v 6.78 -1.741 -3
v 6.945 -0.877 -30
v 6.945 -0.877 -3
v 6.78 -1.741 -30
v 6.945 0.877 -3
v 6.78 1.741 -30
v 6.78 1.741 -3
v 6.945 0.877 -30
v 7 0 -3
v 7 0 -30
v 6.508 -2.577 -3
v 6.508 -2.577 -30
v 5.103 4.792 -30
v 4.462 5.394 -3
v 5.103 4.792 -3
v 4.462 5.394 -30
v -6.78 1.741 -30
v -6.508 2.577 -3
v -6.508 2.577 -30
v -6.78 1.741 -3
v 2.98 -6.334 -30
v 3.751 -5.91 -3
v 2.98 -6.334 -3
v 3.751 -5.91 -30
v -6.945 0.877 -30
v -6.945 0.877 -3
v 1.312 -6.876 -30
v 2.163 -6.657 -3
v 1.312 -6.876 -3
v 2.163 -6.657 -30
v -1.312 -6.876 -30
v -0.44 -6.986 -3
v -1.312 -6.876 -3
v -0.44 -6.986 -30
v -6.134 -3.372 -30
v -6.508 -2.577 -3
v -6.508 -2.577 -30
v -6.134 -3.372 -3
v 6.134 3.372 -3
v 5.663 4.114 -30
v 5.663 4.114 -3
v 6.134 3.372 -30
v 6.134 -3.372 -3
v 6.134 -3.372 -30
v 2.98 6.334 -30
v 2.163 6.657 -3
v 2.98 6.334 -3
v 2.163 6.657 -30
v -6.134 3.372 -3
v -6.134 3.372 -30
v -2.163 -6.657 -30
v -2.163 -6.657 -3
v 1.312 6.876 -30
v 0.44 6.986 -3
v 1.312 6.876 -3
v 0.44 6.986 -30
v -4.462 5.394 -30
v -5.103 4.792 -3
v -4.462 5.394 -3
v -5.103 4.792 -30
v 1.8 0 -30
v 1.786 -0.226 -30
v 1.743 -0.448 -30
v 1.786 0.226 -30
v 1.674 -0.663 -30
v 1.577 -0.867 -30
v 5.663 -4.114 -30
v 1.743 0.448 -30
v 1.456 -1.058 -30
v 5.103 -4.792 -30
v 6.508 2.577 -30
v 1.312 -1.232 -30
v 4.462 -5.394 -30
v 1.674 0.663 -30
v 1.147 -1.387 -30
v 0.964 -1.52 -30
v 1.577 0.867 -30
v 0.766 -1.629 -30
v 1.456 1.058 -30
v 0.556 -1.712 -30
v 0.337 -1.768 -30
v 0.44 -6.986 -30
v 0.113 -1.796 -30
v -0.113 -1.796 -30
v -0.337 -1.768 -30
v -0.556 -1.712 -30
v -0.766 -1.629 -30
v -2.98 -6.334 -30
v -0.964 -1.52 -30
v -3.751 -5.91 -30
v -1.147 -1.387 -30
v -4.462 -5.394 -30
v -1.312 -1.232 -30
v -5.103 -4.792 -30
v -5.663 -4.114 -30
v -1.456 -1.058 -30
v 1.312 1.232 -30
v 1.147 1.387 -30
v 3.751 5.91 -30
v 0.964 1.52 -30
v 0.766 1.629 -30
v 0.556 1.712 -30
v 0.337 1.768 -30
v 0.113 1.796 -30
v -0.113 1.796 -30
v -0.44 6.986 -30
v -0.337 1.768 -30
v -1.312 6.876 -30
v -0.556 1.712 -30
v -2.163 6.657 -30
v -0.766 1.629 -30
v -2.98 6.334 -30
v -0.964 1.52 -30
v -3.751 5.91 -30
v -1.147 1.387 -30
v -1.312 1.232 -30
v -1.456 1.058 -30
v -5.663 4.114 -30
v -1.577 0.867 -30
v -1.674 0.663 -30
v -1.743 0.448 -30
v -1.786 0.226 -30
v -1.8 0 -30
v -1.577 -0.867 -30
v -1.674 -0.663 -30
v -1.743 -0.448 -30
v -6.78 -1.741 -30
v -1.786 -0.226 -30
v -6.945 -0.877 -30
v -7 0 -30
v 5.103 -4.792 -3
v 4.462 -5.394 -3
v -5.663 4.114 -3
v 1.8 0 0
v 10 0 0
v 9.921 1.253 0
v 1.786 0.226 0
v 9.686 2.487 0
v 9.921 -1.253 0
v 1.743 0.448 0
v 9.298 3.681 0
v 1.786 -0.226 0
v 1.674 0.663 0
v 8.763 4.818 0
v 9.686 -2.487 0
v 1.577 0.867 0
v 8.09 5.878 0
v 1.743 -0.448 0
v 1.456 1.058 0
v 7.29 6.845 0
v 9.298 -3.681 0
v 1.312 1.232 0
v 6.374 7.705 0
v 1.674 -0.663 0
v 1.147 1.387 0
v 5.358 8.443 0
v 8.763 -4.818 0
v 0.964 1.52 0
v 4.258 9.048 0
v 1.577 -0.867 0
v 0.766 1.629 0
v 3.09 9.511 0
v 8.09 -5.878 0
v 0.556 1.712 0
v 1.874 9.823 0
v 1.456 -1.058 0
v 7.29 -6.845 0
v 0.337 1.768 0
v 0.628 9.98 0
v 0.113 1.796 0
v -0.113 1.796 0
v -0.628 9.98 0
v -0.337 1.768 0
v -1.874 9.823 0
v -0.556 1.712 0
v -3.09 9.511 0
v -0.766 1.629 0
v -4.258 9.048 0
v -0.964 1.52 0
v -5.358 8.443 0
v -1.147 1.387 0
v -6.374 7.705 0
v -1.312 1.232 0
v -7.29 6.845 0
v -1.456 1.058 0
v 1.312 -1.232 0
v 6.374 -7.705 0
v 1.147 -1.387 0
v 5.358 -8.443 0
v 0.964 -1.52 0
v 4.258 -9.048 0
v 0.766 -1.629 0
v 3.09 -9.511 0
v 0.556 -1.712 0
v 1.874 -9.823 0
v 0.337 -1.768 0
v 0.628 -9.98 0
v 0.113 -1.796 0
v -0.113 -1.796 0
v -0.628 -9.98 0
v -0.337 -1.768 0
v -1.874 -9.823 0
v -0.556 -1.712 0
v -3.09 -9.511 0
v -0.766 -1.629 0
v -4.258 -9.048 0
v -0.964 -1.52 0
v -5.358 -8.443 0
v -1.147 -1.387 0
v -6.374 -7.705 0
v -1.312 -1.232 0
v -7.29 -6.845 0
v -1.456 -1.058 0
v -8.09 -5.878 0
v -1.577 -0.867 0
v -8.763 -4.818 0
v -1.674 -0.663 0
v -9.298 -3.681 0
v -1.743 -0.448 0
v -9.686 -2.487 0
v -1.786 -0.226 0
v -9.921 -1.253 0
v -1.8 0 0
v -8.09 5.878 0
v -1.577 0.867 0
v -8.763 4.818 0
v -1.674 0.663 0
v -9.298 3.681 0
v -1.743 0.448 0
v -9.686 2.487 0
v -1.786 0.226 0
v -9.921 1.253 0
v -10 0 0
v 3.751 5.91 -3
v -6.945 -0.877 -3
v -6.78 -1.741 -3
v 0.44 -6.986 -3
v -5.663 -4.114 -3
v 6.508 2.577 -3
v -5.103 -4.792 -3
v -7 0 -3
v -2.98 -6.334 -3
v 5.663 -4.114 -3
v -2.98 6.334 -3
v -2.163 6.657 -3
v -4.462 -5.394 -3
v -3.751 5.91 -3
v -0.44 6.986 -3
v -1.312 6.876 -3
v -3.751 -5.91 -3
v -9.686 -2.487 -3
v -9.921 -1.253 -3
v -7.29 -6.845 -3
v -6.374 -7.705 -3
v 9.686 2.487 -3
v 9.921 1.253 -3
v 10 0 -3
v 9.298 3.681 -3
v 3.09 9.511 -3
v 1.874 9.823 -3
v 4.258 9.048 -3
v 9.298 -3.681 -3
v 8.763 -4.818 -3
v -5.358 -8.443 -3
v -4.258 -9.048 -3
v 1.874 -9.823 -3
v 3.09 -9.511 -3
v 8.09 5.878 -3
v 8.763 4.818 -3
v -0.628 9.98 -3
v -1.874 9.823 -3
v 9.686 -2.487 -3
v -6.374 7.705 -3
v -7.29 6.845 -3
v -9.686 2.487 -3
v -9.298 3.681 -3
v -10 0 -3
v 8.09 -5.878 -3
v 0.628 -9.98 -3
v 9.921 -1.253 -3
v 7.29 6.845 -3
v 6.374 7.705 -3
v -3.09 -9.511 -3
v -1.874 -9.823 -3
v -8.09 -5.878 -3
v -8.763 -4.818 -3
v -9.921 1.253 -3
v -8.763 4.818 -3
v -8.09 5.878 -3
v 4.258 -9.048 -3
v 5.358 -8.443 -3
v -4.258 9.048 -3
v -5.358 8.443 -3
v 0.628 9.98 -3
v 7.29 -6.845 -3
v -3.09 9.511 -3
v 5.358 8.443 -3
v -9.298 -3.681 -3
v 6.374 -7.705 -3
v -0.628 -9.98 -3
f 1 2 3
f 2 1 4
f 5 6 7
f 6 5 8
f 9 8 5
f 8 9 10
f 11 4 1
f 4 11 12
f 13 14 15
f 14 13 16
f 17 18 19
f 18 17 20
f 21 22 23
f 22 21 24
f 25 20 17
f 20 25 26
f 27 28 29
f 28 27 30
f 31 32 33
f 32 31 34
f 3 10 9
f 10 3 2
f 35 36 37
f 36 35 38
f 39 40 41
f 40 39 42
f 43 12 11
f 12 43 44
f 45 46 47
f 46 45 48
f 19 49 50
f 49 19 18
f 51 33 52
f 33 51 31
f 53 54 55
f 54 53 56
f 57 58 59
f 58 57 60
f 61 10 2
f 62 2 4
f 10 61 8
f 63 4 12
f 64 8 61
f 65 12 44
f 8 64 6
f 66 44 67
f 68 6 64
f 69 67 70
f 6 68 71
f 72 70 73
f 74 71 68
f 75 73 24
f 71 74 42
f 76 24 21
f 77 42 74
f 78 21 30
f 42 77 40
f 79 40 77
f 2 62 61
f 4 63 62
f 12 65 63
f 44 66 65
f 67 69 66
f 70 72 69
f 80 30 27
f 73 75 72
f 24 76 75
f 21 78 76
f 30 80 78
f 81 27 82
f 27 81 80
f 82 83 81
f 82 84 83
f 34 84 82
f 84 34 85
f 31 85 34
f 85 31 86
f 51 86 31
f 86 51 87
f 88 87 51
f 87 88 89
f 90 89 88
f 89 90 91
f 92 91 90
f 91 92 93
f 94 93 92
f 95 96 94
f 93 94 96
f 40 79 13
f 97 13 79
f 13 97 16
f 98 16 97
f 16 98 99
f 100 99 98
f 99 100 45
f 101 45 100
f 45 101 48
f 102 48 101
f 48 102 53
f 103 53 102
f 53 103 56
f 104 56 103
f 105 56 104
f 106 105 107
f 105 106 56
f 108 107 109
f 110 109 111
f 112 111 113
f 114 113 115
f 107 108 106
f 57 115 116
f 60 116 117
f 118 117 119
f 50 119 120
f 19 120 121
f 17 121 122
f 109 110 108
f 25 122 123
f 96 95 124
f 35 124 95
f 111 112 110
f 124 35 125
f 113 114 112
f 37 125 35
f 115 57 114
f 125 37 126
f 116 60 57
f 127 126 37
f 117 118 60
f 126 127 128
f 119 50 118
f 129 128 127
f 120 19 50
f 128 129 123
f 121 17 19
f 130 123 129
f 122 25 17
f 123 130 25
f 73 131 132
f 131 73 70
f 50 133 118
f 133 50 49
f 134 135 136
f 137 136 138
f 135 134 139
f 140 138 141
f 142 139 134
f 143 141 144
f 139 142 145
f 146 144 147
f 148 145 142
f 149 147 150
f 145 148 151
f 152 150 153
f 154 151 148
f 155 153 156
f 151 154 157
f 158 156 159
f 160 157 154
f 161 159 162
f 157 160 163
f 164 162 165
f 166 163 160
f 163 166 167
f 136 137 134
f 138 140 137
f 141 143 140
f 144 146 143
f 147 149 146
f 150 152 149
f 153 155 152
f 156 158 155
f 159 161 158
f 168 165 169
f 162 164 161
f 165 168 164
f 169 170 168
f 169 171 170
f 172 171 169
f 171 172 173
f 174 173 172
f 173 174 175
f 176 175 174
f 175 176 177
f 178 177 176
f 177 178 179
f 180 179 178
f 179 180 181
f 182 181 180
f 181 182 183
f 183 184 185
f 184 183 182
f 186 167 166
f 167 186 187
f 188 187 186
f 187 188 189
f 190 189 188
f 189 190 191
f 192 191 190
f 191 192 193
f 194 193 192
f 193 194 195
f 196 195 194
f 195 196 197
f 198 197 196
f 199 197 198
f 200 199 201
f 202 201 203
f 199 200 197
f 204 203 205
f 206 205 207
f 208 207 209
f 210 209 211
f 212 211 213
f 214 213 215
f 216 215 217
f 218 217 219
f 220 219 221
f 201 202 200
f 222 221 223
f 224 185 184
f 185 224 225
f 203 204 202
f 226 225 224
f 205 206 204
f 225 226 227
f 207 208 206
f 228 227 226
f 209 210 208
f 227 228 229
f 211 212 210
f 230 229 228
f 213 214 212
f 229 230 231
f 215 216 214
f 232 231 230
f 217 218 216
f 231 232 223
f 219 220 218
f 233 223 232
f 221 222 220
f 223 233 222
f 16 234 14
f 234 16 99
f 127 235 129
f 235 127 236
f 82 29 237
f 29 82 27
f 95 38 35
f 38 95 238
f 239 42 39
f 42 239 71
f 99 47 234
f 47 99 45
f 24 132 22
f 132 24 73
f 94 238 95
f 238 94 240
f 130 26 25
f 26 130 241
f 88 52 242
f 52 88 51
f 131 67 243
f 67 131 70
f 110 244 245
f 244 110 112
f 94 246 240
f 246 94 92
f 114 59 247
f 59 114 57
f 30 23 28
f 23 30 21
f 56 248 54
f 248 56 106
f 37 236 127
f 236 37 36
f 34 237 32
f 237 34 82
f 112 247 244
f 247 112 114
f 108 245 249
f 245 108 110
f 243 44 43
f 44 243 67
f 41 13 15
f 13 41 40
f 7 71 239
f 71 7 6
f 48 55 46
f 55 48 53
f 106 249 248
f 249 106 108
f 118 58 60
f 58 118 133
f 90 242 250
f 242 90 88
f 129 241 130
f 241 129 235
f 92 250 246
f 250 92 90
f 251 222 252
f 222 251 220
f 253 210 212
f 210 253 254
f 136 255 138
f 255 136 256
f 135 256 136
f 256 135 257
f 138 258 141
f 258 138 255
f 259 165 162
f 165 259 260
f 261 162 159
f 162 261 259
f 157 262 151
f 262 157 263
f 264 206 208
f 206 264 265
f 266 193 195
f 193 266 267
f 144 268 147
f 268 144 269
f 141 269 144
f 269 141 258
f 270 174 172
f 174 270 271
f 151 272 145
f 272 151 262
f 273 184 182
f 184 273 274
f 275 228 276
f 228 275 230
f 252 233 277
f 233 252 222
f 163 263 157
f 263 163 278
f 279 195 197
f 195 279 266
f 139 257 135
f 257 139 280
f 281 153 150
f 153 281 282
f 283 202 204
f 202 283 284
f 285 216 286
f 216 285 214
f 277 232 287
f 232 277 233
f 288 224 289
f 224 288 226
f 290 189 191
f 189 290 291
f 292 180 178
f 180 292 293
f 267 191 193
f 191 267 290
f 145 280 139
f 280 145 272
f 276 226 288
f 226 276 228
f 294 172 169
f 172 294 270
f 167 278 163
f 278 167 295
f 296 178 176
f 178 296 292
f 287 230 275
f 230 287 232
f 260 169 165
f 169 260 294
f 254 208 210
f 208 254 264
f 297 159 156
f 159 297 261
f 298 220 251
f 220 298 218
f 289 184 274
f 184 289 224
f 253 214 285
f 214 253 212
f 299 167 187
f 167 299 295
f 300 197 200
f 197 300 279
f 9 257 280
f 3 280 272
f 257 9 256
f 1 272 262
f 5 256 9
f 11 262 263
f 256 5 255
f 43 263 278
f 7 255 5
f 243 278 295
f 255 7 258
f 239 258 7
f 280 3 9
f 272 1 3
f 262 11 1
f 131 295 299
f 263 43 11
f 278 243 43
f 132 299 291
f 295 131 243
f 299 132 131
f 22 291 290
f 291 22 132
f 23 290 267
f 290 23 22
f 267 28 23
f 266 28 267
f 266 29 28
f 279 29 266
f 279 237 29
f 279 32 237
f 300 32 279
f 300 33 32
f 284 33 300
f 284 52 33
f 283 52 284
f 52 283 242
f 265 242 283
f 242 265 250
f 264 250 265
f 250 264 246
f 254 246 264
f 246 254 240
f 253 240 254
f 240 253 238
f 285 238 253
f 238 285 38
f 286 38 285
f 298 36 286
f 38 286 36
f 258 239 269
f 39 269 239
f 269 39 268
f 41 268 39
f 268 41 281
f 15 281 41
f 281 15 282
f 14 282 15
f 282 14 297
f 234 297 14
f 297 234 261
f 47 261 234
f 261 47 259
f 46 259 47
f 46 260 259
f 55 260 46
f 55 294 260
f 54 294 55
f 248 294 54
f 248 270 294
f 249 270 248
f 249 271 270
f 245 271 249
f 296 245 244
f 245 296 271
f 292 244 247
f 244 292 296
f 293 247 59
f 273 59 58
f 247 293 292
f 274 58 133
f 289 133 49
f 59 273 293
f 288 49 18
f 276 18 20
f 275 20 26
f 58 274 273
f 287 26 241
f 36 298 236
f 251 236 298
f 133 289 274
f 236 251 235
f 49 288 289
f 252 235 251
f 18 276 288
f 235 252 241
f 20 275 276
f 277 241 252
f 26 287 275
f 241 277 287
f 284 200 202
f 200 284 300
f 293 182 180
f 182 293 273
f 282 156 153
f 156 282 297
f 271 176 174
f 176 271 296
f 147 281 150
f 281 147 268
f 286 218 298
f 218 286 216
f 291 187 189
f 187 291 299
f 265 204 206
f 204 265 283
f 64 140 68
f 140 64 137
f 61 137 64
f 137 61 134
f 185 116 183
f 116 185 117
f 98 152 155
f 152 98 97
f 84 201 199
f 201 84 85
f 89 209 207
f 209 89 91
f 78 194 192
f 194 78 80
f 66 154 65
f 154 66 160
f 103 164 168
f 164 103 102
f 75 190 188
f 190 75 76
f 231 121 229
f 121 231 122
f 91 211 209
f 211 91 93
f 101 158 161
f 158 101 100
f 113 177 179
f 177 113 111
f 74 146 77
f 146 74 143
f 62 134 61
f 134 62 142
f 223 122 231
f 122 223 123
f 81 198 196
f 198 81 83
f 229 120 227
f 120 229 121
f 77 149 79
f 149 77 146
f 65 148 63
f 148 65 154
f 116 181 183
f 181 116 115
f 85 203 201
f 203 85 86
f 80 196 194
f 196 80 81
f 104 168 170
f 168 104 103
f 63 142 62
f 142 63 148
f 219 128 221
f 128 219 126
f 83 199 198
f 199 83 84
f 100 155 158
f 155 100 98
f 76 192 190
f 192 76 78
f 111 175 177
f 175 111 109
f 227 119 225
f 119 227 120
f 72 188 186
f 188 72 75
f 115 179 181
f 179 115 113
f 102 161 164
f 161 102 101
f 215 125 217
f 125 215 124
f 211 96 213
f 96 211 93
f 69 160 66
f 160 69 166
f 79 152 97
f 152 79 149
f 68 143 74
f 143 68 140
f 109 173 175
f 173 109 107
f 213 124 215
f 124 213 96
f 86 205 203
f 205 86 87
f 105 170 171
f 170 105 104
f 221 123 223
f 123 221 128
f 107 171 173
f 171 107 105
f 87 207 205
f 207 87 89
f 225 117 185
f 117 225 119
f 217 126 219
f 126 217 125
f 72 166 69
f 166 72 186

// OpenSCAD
$fn = 50;


difference() {
	union() {
		translate(v = [0, 0, -30.0000000000]) {
			cylinder(h = 30, r = 7.0000000000);
		}
		translate(v = [0, 0, -3.0000000000]) {
			cylinder(h = 3, r = 10.0000000000);
		}
	}
	union() {
		#translate(v = [0, 0, -30]) {
			cylinder(h = 30, r = 1.8000000000);
		}
	}
}
